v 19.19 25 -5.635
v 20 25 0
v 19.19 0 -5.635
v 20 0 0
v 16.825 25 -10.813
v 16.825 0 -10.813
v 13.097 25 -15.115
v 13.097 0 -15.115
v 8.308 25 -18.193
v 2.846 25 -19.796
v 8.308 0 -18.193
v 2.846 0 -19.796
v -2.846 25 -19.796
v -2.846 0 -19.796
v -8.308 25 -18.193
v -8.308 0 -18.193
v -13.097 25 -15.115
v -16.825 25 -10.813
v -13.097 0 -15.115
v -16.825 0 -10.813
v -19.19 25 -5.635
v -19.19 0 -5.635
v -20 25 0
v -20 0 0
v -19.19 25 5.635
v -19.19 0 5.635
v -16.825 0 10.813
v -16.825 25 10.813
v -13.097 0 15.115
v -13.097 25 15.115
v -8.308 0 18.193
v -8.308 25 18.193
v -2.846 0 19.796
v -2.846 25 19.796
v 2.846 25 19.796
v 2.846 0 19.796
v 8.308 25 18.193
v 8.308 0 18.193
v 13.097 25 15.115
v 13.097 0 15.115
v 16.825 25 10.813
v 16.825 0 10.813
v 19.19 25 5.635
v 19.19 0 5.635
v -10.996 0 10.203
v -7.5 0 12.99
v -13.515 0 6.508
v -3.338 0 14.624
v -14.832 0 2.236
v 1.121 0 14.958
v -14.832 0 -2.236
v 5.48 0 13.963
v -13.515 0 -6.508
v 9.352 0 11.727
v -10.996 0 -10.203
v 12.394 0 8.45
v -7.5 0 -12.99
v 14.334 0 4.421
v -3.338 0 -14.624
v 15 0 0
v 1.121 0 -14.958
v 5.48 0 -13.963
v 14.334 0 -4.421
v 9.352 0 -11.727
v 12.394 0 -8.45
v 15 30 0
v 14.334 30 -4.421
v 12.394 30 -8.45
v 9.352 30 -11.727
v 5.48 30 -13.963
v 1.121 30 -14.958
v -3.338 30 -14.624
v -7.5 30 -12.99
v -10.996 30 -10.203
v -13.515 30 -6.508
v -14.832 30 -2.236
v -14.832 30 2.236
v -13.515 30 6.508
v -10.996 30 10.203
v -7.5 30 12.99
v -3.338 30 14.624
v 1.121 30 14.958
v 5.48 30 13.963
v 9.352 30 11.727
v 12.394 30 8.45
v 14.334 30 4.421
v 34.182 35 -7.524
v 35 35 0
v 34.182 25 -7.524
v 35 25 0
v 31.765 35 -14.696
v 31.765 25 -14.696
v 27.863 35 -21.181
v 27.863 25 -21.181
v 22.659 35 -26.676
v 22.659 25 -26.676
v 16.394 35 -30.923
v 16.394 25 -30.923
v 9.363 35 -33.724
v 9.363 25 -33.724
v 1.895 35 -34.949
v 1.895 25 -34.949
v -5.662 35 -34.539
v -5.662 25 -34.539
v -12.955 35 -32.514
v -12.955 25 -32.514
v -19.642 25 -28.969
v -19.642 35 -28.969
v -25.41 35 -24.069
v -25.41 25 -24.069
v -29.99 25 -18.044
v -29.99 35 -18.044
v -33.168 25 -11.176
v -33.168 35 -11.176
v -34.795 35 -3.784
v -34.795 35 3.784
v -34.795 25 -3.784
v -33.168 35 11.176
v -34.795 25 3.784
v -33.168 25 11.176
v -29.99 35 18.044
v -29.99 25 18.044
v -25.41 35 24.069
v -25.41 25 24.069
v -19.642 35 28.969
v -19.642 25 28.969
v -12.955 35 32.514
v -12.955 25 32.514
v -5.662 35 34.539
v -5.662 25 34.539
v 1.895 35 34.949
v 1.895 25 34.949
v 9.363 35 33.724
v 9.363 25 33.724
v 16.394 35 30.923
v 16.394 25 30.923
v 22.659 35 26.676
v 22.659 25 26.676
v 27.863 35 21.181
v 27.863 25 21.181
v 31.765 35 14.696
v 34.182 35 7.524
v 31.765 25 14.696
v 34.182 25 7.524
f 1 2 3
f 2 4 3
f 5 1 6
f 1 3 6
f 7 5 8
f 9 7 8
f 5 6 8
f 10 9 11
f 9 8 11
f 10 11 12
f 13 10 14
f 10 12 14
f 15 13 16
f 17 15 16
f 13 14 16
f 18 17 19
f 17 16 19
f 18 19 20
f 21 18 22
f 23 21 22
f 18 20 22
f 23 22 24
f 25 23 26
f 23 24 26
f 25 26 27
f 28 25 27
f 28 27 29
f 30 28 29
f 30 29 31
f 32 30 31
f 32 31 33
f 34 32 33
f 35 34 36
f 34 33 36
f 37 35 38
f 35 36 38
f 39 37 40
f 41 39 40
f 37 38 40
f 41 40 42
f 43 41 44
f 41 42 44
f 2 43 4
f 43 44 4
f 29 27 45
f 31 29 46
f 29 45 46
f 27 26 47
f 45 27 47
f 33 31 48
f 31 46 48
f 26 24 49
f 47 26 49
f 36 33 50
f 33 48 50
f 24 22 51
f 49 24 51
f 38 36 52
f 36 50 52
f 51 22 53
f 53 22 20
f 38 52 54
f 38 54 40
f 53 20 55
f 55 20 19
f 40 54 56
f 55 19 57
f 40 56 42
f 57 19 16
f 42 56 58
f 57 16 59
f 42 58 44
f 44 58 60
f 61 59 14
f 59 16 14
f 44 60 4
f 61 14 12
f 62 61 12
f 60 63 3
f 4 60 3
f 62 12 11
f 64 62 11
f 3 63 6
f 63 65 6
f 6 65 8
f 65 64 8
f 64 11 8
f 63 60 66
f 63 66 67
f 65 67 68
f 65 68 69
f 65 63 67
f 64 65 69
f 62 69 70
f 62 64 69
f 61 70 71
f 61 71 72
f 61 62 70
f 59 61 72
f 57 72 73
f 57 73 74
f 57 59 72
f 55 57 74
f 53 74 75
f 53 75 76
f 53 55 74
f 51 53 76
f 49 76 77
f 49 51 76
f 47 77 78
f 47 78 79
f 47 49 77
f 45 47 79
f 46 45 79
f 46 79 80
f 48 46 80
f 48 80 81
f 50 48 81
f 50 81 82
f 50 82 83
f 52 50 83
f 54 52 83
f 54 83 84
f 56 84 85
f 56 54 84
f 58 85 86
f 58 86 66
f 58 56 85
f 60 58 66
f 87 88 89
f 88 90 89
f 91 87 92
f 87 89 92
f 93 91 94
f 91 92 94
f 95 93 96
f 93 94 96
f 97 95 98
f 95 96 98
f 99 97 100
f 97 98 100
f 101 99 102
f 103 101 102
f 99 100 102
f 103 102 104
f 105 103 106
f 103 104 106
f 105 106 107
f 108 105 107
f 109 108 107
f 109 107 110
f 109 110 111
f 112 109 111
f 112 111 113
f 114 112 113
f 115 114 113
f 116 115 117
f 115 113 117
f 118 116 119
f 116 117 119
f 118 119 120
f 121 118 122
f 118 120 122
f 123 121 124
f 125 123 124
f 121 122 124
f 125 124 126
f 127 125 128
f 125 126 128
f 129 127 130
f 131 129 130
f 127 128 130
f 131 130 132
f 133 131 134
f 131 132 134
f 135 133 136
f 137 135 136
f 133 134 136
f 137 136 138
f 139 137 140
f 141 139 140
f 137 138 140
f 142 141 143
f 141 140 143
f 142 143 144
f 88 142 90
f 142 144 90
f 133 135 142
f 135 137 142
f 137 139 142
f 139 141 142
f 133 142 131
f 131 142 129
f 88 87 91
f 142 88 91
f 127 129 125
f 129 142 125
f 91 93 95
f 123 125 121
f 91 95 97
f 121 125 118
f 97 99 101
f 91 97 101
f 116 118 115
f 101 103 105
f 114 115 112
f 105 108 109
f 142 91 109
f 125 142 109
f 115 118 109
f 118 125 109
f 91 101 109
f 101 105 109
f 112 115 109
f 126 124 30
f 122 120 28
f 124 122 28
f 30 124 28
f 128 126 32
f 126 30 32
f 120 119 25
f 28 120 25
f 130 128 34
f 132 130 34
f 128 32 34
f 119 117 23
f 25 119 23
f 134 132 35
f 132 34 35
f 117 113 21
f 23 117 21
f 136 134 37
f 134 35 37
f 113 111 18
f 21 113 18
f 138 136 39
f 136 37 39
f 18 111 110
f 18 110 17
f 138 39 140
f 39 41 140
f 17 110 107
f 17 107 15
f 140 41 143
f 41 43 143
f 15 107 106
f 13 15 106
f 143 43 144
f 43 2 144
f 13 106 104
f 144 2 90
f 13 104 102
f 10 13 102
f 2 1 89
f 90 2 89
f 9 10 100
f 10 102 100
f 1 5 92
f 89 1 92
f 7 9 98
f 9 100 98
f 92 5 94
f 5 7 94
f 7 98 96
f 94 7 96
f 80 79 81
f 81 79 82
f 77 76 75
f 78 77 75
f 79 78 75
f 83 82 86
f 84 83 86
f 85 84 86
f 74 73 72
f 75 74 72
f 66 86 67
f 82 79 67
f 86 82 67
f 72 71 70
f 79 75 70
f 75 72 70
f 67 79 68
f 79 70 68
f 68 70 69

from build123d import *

# Parameters (mm, degrees)
SHELL1_OUTLINE_R = 15
SHELL1_DEPTH     = 30


# Read off the part's stored shape, not the designer's step: Shell1
with BuildPart() as part:
    # Sketch1 → Revolve1 (revolve)
    with BuildSketch(Plane.XY):
        Polygon((0, 35), (35, 35), (35, 25), (20, 25), (20, 0), (0, 0), align=None)
    revolve(axis=Axis((0, 0, 0), (0, 1, 0)))

    # Shell1 outline → Shell1 (cut)
    with BuildSketch(Plane(origin=(0, 0, 0), x_dir=(1, 0, 0), z_dir=(0, 1, 0))):
        Circle(SHELL1_OUTLINE_R)
    extrude(amount=SHELL1_DEPTH, mode=Mode.SUBTRACT)


solid = part.part
